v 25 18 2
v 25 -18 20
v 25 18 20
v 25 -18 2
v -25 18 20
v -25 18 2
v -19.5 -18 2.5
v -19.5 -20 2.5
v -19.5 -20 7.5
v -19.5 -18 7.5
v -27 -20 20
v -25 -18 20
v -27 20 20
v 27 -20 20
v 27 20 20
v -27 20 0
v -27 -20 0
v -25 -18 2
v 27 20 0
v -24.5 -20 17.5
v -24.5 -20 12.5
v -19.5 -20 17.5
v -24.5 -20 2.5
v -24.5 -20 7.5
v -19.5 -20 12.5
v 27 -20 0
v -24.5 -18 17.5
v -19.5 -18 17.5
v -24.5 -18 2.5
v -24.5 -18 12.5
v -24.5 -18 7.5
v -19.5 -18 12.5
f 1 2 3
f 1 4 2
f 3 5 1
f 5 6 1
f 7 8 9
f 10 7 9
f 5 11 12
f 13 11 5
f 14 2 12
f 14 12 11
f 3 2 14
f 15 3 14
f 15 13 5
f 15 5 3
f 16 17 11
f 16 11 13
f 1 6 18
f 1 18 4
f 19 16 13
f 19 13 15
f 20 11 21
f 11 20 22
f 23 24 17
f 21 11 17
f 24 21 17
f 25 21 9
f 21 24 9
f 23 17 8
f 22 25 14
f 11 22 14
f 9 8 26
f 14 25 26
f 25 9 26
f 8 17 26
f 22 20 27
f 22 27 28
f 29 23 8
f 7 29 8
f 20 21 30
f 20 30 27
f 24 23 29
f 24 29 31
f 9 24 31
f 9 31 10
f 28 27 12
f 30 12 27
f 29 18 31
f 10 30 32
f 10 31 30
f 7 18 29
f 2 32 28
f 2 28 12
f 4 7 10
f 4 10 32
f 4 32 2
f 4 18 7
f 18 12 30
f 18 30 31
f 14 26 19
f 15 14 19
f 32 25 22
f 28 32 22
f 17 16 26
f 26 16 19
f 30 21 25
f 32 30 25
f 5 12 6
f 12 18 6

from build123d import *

# Parameters (mm, degrees)
F0_W     = 54
F0_H     = 40
F1_DEPTH = 20
F2_T     = -2
F3_W     = 5
F3_H     = 5
F4_DEPTH = 2


with BuildPart() as f1:
    # F0 (on Top) → F1 (new body)
    with BuildSketch(Plane.XY):
        Rectangle(F0_W, F0_H)
    extrude(amount=F1_DEPTH)

    # F2
    f2_openings = [f1.faces().sort_by_distance(p)[0] for p in [
        (0, 0, 20),
    ]]
    offset(amount=F2_T, openings=f2_openings)

    # F3 (on face) → F4 (cut)
    with BuildSketch(Plane.XZ.offset(20)):
        with Locations((-22, 15)):
            Rectangle(F3_W, F3_H)
        with Locations((-22, 5)):
            Rectangle(F3_W, F3_H)
    extrude(amount=-F4_DEPTH, mode=Mode.SUBTRACT)


solid = f1.part
